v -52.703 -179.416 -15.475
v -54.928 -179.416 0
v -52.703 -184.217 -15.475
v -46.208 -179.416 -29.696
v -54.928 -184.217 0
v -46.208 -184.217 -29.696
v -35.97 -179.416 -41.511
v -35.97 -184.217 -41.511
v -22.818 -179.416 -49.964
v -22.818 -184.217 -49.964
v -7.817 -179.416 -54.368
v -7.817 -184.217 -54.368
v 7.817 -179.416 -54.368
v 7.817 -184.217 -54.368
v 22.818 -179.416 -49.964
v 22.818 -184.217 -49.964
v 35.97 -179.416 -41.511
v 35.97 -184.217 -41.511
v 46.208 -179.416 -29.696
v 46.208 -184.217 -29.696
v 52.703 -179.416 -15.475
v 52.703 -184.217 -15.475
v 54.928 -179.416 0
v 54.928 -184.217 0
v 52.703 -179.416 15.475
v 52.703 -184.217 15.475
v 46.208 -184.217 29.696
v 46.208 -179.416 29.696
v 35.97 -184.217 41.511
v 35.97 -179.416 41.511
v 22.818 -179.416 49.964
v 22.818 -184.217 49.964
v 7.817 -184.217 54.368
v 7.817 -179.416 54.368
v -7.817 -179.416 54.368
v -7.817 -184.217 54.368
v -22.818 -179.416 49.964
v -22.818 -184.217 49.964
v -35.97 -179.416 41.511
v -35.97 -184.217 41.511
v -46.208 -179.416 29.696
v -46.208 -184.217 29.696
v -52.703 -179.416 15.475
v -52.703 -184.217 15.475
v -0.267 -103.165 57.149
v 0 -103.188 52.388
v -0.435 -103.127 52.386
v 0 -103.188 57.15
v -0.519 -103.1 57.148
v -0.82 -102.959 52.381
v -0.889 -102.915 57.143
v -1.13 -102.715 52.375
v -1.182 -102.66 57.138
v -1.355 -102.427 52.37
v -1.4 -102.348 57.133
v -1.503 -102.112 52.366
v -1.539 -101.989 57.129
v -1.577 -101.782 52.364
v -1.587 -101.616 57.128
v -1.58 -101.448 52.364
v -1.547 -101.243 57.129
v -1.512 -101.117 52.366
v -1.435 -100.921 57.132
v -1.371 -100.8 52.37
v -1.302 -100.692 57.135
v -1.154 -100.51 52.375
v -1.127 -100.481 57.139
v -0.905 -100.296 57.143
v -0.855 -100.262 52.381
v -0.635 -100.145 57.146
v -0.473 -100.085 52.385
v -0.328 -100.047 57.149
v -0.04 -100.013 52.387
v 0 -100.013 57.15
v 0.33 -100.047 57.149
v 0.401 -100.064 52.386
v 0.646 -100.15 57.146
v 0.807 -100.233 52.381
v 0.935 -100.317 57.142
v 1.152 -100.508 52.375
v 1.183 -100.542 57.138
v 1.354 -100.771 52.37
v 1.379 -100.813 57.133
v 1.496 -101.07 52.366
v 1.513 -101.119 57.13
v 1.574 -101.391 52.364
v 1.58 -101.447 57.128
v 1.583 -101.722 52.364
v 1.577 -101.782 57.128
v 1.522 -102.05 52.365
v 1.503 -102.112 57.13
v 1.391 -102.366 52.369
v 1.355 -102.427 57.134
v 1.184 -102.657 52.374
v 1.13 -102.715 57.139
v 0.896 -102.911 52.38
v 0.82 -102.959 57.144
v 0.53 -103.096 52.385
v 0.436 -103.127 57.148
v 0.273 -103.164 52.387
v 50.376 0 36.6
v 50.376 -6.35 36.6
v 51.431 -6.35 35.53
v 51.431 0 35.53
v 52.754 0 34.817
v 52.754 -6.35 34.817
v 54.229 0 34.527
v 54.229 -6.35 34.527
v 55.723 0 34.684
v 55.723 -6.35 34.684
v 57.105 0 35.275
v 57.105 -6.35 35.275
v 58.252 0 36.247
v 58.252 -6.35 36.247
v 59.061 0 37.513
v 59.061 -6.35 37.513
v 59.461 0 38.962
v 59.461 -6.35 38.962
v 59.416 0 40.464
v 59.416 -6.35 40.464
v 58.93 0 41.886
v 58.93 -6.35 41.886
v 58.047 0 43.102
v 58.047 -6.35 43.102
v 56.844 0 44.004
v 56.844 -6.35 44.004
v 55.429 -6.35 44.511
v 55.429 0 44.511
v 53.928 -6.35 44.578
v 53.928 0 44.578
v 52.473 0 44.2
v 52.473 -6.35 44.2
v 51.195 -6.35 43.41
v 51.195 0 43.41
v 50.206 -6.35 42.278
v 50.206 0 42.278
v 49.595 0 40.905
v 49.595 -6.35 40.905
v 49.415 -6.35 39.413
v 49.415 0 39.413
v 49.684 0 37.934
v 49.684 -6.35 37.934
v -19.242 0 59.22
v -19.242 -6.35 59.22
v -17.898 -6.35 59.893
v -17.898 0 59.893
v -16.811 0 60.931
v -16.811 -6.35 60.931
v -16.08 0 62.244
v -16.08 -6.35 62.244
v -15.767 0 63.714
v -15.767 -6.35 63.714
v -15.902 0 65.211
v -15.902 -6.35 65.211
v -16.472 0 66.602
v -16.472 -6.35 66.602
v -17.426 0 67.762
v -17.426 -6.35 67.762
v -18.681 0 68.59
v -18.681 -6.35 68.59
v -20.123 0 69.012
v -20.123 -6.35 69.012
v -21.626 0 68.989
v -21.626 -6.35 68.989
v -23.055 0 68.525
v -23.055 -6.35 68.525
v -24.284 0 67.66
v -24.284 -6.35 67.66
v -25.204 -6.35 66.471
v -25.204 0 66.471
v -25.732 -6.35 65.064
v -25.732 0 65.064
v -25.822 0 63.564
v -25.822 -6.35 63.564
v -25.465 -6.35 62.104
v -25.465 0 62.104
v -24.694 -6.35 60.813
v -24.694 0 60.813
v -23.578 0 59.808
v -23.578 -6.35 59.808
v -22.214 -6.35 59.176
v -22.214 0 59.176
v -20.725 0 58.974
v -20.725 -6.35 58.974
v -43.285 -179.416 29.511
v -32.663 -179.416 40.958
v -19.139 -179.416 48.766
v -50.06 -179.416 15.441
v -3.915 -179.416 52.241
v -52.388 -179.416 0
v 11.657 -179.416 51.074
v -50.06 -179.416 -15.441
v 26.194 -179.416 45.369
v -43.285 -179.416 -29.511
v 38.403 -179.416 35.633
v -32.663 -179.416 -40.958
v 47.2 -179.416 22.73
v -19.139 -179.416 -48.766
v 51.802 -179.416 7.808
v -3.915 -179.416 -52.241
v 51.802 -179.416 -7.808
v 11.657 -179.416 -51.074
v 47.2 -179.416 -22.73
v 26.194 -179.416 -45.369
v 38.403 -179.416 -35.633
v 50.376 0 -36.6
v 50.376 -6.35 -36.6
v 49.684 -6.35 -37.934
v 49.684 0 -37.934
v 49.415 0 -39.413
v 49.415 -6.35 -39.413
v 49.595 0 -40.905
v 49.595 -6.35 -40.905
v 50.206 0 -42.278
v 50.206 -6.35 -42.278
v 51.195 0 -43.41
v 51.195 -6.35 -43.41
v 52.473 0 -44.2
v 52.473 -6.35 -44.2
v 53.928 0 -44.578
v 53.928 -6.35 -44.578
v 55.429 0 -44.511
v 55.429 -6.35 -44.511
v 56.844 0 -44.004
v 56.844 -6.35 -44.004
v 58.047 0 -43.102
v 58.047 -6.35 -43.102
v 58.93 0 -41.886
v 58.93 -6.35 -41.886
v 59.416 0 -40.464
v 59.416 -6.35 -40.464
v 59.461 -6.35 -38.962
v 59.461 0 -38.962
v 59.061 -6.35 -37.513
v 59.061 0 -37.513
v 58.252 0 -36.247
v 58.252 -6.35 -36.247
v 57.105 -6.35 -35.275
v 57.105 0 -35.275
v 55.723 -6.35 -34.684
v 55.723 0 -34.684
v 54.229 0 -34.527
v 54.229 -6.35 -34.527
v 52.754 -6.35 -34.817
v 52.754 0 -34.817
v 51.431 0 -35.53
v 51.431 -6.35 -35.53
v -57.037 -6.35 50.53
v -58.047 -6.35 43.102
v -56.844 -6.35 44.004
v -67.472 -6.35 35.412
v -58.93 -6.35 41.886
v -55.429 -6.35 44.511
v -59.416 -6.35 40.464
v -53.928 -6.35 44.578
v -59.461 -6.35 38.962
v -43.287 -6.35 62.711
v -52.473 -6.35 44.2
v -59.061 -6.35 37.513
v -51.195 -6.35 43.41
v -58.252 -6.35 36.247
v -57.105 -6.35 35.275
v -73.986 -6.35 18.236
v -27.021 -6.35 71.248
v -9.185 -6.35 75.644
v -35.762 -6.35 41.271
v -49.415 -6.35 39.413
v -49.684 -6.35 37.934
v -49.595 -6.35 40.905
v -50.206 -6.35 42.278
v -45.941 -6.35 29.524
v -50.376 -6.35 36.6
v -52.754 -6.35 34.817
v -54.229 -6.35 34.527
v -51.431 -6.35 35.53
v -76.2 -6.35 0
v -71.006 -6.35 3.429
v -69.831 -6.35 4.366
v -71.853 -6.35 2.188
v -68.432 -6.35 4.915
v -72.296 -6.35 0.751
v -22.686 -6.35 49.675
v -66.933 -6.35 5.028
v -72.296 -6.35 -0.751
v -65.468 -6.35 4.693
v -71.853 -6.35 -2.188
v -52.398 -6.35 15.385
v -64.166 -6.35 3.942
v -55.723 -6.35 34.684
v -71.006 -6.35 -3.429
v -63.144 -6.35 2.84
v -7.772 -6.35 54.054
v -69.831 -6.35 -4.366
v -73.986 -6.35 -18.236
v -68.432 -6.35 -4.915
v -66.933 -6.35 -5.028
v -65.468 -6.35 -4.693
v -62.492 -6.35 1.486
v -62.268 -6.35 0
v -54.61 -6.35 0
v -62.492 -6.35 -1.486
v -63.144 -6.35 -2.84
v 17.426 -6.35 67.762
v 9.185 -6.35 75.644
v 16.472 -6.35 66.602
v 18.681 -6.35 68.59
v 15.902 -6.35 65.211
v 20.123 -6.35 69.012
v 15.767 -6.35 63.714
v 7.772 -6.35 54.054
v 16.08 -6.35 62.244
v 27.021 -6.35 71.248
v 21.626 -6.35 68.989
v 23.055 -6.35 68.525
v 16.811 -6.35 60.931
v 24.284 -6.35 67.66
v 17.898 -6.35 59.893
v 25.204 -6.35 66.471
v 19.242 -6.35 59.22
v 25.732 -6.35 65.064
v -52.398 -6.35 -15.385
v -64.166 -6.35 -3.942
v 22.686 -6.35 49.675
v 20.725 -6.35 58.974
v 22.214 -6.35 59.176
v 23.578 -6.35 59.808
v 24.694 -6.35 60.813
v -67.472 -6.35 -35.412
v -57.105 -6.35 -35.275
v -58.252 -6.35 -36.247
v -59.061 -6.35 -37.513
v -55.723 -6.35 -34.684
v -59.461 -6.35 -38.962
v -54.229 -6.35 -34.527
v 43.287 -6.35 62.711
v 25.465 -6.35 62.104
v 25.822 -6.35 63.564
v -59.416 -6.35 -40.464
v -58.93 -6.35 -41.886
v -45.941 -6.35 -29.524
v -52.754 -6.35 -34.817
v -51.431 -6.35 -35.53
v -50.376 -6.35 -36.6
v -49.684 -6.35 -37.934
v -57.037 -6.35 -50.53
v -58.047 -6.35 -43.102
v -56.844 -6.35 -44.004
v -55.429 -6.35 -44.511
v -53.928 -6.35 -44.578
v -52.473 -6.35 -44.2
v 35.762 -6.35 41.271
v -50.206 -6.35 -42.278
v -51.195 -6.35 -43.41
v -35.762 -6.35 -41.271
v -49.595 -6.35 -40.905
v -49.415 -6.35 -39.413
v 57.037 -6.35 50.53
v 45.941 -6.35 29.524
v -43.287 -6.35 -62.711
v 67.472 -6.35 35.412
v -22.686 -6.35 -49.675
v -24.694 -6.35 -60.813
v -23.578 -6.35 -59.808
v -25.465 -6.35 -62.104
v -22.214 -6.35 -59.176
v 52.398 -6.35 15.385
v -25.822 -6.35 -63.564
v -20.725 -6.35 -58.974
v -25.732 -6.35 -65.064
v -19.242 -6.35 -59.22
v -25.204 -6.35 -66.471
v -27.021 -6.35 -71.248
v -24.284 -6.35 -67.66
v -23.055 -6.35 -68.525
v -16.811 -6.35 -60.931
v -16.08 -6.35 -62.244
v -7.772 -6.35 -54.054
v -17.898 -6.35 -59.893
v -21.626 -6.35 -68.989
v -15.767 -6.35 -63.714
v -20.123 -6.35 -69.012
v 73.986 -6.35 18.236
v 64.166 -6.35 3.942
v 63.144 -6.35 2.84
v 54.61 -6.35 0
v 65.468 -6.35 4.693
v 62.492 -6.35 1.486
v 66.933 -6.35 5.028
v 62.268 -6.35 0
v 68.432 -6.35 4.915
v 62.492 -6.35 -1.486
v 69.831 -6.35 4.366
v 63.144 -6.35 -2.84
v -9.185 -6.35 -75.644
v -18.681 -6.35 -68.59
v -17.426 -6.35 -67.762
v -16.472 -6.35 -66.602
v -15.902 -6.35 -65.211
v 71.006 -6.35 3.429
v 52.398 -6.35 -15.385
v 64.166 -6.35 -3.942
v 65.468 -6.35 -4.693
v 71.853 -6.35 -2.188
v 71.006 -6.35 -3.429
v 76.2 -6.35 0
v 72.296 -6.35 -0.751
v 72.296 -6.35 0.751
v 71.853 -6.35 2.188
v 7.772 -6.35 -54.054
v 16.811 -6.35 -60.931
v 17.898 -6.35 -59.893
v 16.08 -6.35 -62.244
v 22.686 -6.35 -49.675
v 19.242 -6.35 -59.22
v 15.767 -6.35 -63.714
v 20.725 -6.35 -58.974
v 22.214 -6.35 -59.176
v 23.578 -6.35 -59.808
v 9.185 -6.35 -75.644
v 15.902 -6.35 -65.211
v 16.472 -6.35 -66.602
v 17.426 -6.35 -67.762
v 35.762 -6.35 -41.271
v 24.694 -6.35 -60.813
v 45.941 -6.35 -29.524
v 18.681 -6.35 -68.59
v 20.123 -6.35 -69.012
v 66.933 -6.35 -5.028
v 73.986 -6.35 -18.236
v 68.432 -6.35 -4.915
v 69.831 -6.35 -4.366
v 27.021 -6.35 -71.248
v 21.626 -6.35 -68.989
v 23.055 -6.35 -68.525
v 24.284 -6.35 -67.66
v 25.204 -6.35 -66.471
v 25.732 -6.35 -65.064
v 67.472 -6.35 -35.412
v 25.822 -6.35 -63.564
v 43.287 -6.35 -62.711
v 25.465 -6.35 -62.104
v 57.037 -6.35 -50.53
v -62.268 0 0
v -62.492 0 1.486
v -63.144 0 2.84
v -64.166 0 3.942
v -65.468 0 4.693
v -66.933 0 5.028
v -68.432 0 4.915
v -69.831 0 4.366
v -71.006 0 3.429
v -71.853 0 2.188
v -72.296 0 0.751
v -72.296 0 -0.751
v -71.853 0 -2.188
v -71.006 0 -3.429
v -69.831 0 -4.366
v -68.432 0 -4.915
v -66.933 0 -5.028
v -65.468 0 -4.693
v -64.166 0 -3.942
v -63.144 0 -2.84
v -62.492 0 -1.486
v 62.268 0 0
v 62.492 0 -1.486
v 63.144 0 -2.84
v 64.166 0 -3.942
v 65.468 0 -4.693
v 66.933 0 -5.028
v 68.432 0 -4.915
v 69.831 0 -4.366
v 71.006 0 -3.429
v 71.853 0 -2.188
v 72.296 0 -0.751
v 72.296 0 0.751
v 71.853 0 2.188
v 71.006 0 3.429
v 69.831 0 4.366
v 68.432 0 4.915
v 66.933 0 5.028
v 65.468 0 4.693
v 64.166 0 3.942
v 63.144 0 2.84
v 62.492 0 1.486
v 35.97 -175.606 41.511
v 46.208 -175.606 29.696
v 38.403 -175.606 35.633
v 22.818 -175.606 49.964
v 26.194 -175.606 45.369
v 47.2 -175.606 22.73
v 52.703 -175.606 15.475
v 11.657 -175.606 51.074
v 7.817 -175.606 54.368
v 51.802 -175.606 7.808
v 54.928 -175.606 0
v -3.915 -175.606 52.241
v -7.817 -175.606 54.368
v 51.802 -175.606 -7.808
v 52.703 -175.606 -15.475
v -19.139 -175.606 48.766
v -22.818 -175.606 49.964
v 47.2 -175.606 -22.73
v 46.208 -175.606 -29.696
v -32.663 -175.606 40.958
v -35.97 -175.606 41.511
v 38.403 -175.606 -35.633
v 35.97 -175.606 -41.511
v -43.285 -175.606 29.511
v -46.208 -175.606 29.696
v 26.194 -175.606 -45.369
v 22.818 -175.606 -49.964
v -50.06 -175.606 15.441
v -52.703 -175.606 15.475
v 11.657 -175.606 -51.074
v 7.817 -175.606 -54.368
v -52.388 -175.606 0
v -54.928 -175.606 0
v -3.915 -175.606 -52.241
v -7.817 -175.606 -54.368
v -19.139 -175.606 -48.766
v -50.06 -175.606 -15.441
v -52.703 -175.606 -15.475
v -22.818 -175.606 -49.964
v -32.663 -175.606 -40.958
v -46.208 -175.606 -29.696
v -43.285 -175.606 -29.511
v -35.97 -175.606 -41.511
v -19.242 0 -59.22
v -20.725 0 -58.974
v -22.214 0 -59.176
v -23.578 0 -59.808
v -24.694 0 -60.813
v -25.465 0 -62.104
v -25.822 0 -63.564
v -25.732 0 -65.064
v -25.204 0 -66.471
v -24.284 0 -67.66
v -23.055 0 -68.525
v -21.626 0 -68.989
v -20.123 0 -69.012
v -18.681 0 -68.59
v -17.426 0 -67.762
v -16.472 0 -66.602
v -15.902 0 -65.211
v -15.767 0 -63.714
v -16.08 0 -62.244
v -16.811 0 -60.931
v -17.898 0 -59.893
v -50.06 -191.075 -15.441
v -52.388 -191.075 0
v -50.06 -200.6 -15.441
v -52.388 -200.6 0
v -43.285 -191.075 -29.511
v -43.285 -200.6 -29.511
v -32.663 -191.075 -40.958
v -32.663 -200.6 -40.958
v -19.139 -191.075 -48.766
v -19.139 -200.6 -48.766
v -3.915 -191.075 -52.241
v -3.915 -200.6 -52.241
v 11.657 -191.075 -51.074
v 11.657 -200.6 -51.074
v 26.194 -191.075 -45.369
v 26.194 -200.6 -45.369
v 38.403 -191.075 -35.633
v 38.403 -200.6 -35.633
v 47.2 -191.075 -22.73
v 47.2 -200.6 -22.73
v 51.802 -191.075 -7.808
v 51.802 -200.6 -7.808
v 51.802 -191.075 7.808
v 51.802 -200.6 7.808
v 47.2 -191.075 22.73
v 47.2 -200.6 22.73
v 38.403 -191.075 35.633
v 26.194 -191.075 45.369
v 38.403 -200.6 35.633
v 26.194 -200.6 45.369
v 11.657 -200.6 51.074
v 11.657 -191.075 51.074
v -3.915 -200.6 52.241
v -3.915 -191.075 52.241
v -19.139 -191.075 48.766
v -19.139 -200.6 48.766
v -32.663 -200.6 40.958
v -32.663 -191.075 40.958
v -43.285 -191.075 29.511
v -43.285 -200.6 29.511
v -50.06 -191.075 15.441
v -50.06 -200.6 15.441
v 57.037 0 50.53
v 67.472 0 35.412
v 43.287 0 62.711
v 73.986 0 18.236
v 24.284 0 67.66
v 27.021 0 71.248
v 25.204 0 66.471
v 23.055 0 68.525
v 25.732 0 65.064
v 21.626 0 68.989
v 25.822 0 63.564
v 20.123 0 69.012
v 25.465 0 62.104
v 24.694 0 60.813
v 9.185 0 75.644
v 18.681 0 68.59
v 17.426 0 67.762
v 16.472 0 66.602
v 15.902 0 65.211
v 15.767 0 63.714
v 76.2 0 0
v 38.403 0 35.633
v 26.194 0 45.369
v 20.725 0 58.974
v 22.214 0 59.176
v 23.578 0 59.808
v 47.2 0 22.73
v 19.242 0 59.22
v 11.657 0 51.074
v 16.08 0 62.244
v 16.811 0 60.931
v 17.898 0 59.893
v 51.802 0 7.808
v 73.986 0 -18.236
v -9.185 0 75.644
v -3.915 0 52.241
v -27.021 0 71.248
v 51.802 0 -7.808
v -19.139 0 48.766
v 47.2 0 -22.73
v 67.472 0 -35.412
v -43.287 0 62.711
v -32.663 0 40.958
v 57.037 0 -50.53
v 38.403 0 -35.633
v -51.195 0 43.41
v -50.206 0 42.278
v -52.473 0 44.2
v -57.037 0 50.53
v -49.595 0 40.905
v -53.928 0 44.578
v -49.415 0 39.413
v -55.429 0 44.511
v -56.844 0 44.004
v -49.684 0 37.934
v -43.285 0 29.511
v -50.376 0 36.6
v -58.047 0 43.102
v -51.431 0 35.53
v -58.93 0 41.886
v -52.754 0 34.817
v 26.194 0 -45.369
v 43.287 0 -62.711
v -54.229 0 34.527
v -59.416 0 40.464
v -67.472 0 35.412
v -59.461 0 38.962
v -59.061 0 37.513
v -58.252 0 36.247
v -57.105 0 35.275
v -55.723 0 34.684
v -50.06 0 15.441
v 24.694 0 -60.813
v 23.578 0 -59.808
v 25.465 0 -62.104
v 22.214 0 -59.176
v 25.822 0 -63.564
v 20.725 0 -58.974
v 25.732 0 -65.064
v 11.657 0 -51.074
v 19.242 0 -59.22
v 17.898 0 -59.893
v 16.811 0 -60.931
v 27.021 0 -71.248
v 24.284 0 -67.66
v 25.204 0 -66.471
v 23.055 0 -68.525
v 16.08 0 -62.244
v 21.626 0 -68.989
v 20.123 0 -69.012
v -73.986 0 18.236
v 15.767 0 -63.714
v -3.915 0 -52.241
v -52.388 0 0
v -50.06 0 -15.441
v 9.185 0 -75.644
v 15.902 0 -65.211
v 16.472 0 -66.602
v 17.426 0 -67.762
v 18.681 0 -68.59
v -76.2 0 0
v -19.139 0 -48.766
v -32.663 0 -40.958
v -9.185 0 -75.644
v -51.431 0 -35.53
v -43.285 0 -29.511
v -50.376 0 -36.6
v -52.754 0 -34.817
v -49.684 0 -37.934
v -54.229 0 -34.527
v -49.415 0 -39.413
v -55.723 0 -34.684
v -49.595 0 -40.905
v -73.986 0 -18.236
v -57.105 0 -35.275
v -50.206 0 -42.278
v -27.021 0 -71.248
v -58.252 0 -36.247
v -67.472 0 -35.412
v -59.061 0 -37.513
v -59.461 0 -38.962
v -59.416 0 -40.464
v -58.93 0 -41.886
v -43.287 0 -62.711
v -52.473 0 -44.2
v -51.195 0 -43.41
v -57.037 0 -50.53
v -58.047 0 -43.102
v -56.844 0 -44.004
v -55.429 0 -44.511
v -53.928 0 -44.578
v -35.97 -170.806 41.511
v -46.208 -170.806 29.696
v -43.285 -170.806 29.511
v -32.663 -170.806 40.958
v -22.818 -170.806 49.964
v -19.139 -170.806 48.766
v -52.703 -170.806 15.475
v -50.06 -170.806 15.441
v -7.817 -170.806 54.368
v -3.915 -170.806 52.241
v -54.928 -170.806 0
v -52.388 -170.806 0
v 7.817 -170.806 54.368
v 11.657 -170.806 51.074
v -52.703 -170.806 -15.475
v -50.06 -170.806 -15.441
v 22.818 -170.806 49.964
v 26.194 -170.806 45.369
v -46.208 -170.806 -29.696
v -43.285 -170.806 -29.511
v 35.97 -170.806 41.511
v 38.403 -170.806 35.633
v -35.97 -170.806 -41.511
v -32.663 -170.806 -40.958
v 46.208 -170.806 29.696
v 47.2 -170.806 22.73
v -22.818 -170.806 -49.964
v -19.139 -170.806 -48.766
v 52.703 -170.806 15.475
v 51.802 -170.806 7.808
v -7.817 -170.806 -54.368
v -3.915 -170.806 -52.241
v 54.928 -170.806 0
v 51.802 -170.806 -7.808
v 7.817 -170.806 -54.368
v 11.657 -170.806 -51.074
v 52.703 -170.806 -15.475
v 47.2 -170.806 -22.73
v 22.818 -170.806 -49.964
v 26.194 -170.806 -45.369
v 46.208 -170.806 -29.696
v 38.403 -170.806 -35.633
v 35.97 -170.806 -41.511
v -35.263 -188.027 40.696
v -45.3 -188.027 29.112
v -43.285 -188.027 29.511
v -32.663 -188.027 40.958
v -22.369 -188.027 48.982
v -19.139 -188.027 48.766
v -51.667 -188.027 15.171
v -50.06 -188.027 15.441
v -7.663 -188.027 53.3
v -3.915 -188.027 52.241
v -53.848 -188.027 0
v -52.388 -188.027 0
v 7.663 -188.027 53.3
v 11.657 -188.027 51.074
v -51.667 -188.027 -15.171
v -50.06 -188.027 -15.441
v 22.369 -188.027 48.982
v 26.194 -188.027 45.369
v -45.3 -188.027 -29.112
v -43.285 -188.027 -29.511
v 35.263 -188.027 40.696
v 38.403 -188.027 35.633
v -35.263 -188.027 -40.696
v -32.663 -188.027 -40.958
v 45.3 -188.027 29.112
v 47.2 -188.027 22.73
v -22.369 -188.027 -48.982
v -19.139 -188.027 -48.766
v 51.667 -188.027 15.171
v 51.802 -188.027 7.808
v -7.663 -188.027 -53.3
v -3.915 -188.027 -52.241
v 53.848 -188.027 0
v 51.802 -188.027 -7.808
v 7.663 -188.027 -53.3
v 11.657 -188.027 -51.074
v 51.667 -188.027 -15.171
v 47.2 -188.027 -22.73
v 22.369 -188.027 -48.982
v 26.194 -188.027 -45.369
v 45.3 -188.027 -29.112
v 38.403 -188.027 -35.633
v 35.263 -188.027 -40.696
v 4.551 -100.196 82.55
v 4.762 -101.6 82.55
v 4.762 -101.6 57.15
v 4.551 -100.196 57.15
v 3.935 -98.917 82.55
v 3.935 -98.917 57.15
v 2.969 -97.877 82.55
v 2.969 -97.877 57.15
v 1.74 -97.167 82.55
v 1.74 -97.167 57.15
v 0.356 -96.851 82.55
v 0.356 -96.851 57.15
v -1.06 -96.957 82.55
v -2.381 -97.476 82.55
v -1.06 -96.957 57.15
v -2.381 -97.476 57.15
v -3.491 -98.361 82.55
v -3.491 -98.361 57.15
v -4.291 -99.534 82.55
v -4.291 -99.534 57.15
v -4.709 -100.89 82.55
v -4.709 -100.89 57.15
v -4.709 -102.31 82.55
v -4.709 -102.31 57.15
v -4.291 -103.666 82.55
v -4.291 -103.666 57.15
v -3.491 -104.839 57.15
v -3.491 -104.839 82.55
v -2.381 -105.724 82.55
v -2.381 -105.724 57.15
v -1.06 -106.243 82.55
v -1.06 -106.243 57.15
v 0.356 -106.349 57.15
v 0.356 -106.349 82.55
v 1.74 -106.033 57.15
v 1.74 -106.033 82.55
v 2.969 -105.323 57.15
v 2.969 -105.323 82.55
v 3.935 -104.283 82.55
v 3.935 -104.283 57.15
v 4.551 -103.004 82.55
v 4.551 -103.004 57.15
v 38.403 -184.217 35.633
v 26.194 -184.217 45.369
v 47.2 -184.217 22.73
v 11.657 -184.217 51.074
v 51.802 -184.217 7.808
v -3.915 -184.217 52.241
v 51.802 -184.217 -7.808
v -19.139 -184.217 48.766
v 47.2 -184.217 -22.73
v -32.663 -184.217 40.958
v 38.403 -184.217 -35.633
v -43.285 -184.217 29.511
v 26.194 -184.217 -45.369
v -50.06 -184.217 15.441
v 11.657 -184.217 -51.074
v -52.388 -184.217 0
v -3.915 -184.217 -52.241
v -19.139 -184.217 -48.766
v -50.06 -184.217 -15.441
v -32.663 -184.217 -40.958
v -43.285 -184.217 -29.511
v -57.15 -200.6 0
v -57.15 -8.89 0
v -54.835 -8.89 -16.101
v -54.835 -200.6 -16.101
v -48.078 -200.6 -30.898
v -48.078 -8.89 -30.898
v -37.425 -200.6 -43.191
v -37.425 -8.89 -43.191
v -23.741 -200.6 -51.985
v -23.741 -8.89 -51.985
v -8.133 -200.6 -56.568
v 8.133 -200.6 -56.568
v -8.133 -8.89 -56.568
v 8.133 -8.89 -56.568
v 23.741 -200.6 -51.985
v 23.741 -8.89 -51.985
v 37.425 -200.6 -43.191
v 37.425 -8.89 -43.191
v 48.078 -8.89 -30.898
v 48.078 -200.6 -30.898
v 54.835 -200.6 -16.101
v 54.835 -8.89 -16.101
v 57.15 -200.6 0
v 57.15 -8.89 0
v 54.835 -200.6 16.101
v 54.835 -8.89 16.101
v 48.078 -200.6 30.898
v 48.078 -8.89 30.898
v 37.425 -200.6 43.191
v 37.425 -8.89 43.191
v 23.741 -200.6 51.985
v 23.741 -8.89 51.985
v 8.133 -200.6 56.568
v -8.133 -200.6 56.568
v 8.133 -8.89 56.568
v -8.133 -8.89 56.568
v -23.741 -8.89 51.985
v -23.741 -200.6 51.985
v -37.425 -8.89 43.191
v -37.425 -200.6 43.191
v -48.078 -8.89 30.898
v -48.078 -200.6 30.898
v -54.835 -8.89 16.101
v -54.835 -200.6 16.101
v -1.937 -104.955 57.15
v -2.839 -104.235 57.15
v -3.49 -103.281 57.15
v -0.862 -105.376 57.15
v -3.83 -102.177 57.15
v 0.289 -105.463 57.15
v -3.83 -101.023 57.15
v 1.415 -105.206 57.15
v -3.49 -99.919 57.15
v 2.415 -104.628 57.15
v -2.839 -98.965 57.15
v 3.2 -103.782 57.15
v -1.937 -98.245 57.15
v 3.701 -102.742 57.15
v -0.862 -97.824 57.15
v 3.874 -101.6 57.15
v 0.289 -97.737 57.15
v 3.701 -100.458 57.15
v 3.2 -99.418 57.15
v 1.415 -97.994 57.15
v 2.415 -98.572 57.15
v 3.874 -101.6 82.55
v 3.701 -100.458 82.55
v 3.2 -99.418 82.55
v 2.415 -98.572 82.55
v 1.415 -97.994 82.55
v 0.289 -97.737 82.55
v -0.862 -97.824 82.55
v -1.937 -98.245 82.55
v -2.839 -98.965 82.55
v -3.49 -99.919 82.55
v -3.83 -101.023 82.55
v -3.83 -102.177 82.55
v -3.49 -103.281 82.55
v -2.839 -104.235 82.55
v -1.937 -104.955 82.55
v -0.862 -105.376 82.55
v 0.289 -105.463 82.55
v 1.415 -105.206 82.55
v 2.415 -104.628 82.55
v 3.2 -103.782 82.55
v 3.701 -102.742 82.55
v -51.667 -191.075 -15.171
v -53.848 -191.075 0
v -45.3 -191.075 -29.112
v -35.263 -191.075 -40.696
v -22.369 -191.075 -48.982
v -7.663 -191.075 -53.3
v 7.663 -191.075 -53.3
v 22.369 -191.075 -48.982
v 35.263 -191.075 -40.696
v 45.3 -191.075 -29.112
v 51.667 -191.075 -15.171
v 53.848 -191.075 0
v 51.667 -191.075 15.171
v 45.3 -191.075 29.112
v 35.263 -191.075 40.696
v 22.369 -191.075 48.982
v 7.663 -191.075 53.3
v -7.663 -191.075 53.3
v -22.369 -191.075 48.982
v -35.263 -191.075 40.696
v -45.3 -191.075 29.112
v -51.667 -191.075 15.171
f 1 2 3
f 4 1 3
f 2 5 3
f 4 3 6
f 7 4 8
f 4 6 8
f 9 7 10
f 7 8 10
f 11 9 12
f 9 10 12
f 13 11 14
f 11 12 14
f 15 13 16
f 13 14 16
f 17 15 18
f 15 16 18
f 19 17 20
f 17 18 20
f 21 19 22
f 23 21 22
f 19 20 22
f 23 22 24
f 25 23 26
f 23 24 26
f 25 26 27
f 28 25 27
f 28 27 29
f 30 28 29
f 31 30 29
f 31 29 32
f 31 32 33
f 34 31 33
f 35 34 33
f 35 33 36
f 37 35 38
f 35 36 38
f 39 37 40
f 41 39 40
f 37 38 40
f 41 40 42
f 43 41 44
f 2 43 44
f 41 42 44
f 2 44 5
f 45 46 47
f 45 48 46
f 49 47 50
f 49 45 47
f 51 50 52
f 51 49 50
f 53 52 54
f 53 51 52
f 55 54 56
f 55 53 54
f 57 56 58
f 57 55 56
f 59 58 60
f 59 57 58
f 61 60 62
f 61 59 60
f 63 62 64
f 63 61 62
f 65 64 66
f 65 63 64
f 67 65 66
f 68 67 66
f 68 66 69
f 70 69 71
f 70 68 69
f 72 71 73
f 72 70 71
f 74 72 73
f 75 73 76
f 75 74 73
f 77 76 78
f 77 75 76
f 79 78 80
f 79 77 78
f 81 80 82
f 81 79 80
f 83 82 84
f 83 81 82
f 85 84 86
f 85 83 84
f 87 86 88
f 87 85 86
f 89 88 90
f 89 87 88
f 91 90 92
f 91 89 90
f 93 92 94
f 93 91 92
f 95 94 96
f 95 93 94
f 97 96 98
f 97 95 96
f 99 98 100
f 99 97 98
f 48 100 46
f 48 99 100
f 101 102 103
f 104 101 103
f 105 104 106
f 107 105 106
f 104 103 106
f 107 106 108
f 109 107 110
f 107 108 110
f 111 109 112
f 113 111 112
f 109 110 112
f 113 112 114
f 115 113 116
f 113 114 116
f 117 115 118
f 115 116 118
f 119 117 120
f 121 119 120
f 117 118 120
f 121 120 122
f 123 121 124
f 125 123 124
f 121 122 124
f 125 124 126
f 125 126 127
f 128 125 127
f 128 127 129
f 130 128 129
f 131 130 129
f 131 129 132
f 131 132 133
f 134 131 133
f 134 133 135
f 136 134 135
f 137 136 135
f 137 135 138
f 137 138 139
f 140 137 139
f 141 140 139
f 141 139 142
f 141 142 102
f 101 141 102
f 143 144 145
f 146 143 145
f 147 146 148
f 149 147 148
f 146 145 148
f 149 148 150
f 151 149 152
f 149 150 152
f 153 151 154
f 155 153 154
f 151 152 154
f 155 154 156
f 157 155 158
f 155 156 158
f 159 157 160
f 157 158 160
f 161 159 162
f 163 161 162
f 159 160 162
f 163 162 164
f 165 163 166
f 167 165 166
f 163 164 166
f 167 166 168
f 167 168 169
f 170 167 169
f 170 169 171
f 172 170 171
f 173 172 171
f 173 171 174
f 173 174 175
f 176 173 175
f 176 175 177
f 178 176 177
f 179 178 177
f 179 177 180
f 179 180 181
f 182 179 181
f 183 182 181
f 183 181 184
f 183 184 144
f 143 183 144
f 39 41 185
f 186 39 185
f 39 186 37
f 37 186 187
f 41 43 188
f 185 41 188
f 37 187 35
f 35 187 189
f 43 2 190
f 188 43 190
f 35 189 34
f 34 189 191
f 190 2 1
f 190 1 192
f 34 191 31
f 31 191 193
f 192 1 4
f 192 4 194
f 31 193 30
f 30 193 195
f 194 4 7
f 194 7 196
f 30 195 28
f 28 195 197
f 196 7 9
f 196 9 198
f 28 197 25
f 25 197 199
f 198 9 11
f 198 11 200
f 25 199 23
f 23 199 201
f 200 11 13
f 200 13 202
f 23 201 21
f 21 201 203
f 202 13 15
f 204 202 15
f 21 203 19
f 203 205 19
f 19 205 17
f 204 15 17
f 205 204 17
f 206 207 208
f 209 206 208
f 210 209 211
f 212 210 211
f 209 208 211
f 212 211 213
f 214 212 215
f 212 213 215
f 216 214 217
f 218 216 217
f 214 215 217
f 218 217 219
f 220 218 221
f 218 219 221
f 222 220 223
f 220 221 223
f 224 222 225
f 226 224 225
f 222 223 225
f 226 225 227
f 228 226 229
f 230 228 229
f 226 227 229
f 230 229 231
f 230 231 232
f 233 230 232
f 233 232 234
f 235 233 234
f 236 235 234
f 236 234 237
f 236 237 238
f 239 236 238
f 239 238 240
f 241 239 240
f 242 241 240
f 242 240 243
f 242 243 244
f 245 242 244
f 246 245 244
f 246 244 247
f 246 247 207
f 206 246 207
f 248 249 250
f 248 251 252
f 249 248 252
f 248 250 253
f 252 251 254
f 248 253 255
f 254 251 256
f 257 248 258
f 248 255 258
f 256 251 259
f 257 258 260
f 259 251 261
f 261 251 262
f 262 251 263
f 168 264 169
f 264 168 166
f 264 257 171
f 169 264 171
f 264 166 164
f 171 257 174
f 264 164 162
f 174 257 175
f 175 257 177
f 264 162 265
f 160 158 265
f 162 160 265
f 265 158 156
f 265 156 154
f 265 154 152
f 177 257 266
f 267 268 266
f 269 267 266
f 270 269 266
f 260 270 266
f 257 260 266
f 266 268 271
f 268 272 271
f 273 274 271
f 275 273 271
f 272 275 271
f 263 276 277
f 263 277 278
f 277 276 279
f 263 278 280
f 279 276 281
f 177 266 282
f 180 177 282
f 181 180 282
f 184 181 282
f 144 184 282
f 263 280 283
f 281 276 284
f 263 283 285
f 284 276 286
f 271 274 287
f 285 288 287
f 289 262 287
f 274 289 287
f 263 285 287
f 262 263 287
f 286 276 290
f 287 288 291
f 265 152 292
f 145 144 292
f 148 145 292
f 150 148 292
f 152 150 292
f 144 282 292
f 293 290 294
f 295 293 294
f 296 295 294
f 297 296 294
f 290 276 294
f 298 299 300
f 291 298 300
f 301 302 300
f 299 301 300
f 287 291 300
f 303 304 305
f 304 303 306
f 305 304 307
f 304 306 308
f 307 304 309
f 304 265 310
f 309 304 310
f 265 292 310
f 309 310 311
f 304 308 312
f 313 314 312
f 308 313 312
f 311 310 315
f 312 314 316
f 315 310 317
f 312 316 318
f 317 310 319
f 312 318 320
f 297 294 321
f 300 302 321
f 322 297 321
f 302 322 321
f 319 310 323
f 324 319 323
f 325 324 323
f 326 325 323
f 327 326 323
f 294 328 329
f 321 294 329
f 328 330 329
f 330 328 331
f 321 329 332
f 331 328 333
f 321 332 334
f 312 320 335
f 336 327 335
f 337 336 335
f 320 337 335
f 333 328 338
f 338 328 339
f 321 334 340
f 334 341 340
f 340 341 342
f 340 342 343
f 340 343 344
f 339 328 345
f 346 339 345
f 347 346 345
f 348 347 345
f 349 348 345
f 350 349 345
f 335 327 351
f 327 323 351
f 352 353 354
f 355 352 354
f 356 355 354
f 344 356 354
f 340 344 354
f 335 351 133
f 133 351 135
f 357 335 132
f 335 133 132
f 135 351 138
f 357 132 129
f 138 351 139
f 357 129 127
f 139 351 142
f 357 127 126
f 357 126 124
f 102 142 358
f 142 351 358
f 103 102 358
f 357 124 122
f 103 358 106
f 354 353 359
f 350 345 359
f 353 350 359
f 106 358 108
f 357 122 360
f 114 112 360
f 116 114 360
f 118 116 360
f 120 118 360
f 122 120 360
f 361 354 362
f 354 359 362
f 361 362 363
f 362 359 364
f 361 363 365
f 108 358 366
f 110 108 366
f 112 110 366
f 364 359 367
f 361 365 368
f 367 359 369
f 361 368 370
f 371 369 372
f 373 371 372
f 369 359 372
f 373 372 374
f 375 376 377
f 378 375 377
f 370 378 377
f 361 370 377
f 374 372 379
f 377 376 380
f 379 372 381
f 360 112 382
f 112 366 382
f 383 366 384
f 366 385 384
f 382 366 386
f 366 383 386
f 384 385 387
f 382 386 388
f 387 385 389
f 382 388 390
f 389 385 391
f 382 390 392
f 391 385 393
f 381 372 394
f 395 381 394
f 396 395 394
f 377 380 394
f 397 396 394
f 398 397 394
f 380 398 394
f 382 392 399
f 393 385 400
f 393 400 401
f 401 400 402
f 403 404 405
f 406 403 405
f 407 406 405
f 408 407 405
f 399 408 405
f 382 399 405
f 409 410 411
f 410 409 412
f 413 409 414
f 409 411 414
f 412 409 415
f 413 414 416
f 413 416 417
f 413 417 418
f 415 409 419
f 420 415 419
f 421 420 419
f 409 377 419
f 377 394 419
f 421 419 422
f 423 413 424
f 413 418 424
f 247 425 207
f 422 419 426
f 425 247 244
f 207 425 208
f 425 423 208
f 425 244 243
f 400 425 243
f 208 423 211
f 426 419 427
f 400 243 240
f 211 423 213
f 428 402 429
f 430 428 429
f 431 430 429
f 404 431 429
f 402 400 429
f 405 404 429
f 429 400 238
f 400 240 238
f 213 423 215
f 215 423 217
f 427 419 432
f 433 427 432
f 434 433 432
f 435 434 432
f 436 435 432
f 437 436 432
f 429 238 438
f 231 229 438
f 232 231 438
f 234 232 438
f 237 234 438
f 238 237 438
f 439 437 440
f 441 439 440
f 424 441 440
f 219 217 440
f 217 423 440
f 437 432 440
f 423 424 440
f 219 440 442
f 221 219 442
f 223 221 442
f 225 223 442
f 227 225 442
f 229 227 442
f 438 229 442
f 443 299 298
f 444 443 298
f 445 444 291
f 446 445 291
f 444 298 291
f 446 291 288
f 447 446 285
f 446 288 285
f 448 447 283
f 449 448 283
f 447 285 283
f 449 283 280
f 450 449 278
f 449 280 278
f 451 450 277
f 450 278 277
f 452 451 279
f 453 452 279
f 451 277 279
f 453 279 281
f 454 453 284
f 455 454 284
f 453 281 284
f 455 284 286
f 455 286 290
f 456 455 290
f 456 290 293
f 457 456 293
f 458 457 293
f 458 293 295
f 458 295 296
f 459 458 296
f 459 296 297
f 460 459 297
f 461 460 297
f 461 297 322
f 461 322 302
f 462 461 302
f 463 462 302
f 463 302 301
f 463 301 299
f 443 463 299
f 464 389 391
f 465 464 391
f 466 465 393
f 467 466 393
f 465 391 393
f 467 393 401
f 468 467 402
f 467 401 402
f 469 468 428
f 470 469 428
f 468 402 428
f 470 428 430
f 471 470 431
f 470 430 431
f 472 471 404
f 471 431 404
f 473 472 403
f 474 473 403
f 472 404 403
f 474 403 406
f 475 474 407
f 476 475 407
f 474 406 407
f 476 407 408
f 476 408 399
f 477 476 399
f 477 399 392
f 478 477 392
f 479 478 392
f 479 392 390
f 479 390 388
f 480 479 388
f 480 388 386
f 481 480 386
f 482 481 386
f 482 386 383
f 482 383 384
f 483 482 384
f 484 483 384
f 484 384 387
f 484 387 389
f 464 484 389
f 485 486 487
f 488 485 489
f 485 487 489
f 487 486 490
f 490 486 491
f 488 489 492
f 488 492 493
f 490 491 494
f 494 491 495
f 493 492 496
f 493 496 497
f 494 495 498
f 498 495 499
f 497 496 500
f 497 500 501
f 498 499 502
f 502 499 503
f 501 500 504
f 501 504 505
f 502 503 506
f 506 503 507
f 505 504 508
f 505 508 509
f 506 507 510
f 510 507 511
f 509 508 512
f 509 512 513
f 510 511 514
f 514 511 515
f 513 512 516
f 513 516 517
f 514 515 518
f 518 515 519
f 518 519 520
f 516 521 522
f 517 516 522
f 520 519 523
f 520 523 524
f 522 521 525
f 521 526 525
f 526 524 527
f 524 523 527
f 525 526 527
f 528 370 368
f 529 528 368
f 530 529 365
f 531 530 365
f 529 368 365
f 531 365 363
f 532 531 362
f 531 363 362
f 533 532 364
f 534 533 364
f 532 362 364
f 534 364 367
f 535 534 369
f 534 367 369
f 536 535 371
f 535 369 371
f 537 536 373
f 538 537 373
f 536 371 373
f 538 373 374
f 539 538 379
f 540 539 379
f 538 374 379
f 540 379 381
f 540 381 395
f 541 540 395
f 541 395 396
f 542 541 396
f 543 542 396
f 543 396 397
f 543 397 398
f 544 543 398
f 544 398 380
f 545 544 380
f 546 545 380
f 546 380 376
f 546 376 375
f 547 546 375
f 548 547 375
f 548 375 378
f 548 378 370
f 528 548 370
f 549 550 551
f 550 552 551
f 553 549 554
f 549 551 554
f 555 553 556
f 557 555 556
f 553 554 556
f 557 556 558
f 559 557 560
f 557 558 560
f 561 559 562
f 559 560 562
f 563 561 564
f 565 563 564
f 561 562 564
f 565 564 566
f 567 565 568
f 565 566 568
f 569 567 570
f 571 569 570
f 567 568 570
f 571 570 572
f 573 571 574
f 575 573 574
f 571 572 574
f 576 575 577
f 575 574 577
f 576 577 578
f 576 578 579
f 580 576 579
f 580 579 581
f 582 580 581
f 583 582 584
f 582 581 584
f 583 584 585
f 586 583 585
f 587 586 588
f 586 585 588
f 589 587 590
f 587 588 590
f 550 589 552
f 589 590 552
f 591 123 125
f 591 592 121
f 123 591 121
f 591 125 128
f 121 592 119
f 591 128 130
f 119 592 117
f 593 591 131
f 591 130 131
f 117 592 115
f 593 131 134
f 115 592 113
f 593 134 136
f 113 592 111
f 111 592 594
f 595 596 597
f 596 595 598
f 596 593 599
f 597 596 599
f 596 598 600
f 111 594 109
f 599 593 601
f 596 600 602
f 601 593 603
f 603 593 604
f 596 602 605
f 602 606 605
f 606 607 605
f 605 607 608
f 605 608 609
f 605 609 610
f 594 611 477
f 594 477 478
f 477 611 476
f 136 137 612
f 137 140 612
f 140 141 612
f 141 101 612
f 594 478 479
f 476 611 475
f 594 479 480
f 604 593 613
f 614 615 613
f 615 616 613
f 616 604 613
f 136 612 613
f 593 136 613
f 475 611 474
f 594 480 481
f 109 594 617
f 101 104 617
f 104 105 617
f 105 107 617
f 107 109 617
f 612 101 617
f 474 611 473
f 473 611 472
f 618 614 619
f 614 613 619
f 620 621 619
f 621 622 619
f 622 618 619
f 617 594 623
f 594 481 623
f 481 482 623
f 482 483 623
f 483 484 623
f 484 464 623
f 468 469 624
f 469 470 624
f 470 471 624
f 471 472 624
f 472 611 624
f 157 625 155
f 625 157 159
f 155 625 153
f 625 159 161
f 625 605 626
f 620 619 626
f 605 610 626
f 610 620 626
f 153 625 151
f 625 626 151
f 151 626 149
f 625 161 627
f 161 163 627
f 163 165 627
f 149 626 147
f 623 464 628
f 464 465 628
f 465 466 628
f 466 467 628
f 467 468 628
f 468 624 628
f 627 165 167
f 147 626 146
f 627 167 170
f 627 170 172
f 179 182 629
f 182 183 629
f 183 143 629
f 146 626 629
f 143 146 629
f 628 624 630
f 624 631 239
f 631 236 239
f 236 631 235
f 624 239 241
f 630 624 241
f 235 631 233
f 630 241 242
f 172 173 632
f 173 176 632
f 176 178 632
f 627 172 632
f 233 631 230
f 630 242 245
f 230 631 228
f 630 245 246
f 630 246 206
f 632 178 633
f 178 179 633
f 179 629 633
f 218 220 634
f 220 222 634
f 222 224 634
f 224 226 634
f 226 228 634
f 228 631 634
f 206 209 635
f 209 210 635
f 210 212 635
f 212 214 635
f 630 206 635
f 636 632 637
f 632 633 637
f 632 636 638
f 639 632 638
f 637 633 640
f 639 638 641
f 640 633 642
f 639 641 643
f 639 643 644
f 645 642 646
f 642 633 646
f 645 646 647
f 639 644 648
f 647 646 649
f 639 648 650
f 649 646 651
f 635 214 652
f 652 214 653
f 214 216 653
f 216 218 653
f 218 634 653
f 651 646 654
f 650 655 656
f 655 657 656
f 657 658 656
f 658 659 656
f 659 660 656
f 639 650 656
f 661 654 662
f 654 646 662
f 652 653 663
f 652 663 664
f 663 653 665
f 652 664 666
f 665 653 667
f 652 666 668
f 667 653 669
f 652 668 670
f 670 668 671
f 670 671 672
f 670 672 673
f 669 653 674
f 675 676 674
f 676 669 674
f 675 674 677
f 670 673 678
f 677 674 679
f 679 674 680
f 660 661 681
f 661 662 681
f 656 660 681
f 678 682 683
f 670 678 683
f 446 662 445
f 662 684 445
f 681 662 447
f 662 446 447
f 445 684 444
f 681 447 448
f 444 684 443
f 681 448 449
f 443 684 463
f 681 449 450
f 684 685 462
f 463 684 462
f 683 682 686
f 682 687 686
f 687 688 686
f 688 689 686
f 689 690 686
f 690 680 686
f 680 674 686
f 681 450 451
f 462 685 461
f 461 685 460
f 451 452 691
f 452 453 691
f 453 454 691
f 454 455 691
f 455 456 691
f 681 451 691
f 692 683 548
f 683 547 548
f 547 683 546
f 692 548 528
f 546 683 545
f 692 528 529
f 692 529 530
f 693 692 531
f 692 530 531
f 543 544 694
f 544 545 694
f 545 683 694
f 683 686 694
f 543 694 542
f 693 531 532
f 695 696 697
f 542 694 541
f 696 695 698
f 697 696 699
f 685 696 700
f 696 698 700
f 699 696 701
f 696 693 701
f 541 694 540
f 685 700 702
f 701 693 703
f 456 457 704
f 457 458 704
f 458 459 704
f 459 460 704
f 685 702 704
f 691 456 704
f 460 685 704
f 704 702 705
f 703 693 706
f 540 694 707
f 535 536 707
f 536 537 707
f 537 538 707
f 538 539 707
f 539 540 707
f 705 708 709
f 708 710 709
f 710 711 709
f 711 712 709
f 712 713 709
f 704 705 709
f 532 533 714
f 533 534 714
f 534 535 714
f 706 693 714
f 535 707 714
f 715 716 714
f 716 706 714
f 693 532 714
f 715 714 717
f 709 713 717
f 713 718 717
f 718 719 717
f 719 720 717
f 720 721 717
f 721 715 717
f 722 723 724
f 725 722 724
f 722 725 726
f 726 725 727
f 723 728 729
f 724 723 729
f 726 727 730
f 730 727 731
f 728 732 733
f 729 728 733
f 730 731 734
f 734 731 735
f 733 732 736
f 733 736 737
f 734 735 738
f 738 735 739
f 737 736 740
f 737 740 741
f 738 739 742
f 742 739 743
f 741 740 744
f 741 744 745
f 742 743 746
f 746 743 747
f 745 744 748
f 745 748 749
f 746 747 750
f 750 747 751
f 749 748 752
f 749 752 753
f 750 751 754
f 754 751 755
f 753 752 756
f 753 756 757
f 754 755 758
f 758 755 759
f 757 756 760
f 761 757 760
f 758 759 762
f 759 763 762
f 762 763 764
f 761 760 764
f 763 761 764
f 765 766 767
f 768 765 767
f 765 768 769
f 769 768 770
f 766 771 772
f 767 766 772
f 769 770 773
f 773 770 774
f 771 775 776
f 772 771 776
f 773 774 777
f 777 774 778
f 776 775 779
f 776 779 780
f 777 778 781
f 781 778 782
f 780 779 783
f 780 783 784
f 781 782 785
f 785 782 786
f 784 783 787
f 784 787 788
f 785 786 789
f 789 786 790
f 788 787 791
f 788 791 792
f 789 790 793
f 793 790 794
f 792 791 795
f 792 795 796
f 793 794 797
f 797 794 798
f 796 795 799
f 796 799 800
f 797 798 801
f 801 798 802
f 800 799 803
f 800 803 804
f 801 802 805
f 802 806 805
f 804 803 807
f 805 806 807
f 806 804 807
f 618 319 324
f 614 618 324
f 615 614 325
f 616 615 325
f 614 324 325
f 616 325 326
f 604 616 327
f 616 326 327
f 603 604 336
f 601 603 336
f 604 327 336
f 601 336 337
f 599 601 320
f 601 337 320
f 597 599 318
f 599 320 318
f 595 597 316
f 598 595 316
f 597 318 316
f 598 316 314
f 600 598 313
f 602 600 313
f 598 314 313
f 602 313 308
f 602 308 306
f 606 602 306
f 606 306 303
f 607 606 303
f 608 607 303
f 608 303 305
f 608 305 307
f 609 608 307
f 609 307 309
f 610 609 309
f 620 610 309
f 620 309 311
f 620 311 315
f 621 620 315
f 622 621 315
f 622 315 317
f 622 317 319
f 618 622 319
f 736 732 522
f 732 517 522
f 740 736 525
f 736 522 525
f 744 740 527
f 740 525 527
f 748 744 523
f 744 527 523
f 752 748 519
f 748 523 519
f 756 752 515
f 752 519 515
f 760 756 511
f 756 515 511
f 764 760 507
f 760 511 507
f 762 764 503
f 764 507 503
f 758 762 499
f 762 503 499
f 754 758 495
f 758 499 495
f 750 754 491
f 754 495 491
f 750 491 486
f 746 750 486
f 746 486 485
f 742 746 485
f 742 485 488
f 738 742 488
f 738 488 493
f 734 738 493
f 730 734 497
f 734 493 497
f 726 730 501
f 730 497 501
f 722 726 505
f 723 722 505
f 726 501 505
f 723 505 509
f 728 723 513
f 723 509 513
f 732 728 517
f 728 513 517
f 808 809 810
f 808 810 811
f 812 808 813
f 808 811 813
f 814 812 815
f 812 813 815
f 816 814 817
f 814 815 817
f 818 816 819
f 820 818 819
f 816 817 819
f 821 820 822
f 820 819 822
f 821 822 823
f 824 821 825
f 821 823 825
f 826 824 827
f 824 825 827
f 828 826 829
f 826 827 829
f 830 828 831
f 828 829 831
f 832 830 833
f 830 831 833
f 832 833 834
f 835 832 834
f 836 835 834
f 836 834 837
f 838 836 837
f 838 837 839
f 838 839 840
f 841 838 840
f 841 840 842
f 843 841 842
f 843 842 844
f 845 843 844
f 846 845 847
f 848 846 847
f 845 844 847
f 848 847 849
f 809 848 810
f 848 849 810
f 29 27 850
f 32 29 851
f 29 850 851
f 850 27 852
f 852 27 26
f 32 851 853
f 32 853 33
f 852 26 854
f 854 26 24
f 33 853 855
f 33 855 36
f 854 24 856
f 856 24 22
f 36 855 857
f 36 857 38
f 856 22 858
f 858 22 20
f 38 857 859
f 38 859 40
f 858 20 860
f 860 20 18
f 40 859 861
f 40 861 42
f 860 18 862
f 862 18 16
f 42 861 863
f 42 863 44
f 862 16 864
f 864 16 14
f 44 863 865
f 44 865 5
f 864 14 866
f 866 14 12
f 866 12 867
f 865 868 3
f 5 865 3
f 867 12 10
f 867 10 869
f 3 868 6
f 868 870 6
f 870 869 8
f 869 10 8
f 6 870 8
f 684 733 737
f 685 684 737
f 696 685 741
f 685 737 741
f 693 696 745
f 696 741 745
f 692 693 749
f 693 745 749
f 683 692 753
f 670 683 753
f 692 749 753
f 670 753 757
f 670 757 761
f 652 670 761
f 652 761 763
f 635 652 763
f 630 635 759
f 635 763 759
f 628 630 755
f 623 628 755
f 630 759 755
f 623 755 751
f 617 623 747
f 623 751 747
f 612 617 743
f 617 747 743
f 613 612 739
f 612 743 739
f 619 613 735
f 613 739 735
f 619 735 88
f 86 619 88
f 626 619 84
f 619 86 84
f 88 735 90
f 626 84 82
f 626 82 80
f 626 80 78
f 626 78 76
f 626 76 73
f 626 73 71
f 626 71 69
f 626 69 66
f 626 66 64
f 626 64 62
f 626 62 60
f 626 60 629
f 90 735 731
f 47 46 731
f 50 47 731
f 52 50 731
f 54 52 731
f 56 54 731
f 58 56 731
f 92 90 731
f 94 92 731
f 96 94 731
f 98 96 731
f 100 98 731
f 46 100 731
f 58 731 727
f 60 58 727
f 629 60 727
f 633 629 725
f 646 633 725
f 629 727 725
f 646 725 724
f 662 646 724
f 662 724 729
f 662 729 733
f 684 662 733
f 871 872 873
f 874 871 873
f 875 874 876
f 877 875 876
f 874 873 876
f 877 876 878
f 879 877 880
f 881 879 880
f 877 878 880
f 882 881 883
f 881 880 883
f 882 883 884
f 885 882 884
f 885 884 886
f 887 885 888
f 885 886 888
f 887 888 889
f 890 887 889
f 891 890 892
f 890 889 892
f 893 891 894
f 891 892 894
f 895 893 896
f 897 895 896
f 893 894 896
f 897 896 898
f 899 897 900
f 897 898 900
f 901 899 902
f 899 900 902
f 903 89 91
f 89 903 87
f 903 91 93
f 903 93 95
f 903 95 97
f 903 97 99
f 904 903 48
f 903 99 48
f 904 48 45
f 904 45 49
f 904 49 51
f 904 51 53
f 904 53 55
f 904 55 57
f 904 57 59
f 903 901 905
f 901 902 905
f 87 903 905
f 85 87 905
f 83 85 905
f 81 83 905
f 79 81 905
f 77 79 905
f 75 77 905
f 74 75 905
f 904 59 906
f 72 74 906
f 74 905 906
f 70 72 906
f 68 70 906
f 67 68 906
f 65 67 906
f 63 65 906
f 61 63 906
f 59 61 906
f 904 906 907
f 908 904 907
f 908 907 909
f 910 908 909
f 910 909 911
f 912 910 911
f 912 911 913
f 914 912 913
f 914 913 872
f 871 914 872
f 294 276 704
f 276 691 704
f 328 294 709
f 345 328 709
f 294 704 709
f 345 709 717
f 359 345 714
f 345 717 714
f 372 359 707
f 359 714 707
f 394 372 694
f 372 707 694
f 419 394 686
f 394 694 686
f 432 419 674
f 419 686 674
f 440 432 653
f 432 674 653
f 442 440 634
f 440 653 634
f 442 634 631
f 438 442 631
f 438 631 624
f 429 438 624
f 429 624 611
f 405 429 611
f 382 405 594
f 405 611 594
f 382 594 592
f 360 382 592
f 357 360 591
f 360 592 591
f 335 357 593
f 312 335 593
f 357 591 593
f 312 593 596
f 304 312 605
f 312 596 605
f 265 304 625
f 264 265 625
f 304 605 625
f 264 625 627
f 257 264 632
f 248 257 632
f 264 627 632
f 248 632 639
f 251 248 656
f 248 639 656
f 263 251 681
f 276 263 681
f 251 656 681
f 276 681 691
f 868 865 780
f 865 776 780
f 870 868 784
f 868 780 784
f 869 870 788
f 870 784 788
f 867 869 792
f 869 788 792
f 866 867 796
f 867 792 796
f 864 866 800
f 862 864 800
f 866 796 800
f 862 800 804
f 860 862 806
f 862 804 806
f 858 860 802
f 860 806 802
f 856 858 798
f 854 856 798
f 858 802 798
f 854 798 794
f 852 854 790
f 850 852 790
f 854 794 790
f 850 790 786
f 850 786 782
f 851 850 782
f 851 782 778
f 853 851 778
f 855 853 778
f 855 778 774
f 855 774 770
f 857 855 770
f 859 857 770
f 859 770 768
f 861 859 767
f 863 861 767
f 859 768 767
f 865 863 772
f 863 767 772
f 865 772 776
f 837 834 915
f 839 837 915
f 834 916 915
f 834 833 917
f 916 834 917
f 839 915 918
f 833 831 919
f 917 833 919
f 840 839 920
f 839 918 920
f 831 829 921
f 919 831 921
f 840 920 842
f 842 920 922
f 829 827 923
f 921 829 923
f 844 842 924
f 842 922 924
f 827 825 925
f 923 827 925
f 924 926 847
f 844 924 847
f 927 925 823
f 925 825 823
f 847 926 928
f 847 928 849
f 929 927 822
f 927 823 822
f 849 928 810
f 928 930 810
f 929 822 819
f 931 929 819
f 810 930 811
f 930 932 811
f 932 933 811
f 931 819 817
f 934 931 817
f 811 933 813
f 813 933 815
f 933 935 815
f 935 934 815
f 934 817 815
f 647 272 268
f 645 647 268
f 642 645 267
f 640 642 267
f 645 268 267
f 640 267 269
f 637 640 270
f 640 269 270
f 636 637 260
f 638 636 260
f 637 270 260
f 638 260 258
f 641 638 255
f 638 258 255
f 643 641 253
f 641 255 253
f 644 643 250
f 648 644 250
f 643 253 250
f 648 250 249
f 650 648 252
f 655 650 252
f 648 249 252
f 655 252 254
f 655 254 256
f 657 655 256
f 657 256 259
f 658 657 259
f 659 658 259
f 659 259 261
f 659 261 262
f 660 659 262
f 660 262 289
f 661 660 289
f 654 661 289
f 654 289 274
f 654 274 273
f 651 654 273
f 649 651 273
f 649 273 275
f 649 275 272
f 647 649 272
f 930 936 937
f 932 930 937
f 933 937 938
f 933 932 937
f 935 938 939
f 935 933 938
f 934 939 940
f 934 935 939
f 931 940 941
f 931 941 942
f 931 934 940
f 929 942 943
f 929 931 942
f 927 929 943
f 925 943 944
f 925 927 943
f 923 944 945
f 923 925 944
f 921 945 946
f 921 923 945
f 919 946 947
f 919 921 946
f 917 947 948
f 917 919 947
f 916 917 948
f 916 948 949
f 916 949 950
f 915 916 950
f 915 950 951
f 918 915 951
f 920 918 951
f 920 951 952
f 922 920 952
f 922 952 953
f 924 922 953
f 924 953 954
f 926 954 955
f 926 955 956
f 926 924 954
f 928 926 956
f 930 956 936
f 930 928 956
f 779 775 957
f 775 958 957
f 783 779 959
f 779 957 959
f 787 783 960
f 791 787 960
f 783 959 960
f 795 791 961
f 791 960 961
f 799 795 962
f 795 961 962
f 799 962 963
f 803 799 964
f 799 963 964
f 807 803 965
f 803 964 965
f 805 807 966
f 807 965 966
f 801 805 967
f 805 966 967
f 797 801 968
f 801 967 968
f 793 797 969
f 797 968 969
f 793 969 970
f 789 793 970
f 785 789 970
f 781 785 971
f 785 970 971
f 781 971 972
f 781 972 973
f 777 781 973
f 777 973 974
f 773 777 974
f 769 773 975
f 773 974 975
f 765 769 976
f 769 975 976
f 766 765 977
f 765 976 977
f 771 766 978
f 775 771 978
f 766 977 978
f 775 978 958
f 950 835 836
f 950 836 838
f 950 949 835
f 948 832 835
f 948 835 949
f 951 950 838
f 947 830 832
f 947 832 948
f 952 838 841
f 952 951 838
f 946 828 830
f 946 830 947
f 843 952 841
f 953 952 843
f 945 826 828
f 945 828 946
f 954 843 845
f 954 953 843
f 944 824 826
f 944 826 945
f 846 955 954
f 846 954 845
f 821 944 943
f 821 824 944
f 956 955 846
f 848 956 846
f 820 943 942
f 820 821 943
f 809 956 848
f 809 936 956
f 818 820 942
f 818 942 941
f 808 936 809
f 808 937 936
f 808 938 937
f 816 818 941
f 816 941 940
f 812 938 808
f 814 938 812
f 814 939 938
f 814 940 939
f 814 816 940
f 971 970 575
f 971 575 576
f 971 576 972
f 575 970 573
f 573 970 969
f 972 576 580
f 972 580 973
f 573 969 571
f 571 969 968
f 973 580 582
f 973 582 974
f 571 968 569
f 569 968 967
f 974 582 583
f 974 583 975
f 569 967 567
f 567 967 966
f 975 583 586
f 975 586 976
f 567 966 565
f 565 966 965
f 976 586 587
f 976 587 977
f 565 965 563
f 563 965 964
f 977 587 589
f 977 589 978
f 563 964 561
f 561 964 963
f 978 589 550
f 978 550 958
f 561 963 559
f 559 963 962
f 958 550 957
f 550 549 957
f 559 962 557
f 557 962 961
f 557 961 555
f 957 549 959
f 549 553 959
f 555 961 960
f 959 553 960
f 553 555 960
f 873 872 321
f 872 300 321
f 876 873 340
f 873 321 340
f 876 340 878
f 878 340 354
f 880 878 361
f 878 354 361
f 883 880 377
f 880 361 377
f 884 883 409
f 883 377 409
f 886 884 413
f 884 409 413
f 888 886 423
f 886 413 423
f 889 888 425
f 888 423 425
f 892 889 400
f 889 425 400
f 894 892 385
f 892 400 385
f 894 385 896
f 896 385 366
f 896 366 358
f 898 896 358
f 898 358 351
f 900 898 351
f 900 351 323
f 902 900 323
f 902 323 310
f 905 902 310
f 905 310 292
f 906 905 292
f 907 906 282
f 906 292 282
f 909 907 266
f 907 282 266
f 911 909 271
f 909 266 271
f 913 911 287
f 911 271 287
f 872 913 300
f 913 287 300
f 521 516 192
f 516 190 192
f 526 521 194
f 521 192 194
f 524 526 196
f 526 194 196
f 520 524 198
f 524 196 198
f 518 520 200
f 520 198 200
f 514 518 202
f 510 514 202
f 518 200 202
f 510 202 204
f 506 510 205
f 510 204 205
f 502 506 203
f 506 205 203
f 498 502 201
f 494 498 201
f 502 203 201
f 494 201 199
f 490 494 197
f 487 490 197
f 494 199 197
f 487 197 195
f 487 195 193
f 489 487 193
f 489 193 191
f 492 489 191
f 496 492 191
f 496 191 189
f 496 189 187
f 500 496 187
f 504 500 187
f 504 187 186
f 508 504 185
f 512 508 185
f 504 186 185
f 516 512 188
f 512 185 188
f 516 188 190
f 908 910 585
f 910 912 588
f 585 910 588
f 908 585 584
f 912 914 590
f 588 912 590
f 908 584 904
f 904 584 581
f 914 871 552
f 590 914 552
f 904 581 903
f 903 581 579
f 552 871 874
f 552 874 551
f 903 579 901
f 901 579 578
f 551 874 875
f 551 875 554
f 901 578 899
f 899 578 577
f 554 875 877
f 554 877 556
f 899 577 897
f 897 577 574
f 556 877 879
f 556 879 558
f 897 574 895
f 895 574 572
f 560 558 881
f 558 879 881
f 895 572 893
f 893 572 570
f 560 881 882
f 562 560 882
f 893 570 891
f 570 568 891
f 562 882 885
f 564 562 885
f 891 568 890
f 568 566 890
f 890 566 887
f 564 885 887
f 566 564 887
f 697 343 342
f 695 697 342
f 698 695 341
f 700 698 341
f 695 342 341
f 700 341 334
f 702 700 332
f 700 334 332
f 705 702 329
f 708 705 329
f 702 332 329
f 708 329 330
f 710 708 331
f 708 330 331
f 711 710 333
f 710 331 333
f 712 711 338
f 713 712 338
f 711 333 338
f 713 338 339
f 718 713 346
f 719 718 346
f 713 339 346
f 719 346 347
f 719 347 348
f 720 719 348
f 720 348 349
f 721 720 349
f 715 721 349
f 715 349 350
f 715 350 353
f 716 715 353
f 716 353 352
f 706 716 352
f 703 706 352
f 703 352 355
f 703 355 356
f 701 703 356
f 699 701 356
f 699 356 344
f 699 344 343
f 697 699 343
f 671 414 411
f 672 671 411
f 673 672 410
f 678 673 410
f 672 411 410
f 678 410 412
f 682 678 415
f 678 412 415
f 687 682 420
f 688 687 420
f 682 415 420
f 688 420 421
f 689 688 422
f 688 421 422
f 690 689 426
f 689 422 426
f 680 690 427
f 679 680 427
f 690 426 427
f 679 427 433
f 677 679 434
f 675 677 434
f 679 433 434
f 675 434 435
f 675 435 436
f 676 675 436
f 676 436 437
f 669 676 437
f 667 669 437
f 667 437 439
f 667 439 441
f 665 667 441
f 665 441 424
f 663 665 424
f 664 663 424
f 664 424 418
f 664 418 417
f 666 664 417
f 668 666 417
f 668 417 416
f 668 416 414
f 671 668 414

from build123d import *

# Parameters (mm, degrees)
TAP_DRILL_FOR_3_8_16_TAP1_D = 10.0838
CIRPATTERN1_COUNT           = 10
SKETCH4_R                   = 4.7625
SKETCH4_R_2                 = 3.8735
BOSS_EXTRUDE1_DEPTH         = 25.4


with BuildPart() as part:
    # Sketch1 → Revolve1 (revolve)
    with BuildSketch(Plane.XY, mode=Mode.PRIVATE) as revolve1_sk:
        Polygon((52.3875, 0), (52.3875, -170.805763516), (54.9275, -170.805763516), (54.9275, -175.606363516), (52.3875, -175.606363516), (52.3875, -179.416363516), (54.9275, -179.416363516), (54.9275, -184.216963516), (52.3875, -184.216963516), (52.3875, -188.026963516), (53.848, -188.026963516), (53.848, -191.074963516), (52.3875, -191.074963516), (52.3875, -200.599963516), (57.15, -200.599963516), (57.15, -8.89), (54.61, -6.35), (76.2, -6.35), (76.2, 0), align=None)
    revolve(revolve1_sk.sketch.rotate(Axis((0, 0, 0), (0, -1, 0)), 180), axis=Axis((0, 0, 0), (0, -1, 0)))

    # Tap Drill for 3/8-16 Tap1 (through all)
    with Locations(Plane(origin=(0, 0, 0), x_dir=(1, 0, 0), z_dir=(0, 1, 0))):
        with Locations((67.31, 0)):
            tap_drill_for_3_8_16_tap1 = Hole(TAP_DRILL_FOR_3_8_16_TAP1_D / 2)

    # CirPattern1: Tap Drill for 3/8-16 Tap1 ×10 about axis
    cirpattern1_axis = Axis((0, 0, 0), (0, 1, 0))
    for i in range(1, CIRPATTERN1_COUNT):
        add(tap_drill_for_3_8_16_tap1.rotate(cirpattern1_axis, i * 360 / CIRPATTERN1_COUNT), mode=Mode.SUBTRACT)

    # Sketch11 → 1/8 (0.125) Diameter Hole3 (revolve, cut)
    with BuildSketch(Plane(origin=(0, -101.6, 57.15), x_dir=(0, -1, 0), z_dir=(1, 0, 0))):
        Polygon((0, 0), (0, 26.353866233), (1.5875, 25.4), (1.5875, 0), align=None)
    revolve(axis=Axis((0, -101.6, 63.5), (0, 0, -1)), mode=Mode.SUBTRACT)


with BuildPart() as body_2:
    # Sketch4 → Boss-Extrude1 (new body)
    with BuildSketch(Plane.XY.offset(57.15)):
        with Locations((0, -101.6)):
            Circle(SKETCH4_R)
        with Locations((0, -101.6)):
            Circle(SKETCH4_R_2, mode=Mode.SUBTRACT)
    extrude(amount=BOSS_EXTRUDE1_DEPTH)


solid = Compound([part.part, body_2.part])
